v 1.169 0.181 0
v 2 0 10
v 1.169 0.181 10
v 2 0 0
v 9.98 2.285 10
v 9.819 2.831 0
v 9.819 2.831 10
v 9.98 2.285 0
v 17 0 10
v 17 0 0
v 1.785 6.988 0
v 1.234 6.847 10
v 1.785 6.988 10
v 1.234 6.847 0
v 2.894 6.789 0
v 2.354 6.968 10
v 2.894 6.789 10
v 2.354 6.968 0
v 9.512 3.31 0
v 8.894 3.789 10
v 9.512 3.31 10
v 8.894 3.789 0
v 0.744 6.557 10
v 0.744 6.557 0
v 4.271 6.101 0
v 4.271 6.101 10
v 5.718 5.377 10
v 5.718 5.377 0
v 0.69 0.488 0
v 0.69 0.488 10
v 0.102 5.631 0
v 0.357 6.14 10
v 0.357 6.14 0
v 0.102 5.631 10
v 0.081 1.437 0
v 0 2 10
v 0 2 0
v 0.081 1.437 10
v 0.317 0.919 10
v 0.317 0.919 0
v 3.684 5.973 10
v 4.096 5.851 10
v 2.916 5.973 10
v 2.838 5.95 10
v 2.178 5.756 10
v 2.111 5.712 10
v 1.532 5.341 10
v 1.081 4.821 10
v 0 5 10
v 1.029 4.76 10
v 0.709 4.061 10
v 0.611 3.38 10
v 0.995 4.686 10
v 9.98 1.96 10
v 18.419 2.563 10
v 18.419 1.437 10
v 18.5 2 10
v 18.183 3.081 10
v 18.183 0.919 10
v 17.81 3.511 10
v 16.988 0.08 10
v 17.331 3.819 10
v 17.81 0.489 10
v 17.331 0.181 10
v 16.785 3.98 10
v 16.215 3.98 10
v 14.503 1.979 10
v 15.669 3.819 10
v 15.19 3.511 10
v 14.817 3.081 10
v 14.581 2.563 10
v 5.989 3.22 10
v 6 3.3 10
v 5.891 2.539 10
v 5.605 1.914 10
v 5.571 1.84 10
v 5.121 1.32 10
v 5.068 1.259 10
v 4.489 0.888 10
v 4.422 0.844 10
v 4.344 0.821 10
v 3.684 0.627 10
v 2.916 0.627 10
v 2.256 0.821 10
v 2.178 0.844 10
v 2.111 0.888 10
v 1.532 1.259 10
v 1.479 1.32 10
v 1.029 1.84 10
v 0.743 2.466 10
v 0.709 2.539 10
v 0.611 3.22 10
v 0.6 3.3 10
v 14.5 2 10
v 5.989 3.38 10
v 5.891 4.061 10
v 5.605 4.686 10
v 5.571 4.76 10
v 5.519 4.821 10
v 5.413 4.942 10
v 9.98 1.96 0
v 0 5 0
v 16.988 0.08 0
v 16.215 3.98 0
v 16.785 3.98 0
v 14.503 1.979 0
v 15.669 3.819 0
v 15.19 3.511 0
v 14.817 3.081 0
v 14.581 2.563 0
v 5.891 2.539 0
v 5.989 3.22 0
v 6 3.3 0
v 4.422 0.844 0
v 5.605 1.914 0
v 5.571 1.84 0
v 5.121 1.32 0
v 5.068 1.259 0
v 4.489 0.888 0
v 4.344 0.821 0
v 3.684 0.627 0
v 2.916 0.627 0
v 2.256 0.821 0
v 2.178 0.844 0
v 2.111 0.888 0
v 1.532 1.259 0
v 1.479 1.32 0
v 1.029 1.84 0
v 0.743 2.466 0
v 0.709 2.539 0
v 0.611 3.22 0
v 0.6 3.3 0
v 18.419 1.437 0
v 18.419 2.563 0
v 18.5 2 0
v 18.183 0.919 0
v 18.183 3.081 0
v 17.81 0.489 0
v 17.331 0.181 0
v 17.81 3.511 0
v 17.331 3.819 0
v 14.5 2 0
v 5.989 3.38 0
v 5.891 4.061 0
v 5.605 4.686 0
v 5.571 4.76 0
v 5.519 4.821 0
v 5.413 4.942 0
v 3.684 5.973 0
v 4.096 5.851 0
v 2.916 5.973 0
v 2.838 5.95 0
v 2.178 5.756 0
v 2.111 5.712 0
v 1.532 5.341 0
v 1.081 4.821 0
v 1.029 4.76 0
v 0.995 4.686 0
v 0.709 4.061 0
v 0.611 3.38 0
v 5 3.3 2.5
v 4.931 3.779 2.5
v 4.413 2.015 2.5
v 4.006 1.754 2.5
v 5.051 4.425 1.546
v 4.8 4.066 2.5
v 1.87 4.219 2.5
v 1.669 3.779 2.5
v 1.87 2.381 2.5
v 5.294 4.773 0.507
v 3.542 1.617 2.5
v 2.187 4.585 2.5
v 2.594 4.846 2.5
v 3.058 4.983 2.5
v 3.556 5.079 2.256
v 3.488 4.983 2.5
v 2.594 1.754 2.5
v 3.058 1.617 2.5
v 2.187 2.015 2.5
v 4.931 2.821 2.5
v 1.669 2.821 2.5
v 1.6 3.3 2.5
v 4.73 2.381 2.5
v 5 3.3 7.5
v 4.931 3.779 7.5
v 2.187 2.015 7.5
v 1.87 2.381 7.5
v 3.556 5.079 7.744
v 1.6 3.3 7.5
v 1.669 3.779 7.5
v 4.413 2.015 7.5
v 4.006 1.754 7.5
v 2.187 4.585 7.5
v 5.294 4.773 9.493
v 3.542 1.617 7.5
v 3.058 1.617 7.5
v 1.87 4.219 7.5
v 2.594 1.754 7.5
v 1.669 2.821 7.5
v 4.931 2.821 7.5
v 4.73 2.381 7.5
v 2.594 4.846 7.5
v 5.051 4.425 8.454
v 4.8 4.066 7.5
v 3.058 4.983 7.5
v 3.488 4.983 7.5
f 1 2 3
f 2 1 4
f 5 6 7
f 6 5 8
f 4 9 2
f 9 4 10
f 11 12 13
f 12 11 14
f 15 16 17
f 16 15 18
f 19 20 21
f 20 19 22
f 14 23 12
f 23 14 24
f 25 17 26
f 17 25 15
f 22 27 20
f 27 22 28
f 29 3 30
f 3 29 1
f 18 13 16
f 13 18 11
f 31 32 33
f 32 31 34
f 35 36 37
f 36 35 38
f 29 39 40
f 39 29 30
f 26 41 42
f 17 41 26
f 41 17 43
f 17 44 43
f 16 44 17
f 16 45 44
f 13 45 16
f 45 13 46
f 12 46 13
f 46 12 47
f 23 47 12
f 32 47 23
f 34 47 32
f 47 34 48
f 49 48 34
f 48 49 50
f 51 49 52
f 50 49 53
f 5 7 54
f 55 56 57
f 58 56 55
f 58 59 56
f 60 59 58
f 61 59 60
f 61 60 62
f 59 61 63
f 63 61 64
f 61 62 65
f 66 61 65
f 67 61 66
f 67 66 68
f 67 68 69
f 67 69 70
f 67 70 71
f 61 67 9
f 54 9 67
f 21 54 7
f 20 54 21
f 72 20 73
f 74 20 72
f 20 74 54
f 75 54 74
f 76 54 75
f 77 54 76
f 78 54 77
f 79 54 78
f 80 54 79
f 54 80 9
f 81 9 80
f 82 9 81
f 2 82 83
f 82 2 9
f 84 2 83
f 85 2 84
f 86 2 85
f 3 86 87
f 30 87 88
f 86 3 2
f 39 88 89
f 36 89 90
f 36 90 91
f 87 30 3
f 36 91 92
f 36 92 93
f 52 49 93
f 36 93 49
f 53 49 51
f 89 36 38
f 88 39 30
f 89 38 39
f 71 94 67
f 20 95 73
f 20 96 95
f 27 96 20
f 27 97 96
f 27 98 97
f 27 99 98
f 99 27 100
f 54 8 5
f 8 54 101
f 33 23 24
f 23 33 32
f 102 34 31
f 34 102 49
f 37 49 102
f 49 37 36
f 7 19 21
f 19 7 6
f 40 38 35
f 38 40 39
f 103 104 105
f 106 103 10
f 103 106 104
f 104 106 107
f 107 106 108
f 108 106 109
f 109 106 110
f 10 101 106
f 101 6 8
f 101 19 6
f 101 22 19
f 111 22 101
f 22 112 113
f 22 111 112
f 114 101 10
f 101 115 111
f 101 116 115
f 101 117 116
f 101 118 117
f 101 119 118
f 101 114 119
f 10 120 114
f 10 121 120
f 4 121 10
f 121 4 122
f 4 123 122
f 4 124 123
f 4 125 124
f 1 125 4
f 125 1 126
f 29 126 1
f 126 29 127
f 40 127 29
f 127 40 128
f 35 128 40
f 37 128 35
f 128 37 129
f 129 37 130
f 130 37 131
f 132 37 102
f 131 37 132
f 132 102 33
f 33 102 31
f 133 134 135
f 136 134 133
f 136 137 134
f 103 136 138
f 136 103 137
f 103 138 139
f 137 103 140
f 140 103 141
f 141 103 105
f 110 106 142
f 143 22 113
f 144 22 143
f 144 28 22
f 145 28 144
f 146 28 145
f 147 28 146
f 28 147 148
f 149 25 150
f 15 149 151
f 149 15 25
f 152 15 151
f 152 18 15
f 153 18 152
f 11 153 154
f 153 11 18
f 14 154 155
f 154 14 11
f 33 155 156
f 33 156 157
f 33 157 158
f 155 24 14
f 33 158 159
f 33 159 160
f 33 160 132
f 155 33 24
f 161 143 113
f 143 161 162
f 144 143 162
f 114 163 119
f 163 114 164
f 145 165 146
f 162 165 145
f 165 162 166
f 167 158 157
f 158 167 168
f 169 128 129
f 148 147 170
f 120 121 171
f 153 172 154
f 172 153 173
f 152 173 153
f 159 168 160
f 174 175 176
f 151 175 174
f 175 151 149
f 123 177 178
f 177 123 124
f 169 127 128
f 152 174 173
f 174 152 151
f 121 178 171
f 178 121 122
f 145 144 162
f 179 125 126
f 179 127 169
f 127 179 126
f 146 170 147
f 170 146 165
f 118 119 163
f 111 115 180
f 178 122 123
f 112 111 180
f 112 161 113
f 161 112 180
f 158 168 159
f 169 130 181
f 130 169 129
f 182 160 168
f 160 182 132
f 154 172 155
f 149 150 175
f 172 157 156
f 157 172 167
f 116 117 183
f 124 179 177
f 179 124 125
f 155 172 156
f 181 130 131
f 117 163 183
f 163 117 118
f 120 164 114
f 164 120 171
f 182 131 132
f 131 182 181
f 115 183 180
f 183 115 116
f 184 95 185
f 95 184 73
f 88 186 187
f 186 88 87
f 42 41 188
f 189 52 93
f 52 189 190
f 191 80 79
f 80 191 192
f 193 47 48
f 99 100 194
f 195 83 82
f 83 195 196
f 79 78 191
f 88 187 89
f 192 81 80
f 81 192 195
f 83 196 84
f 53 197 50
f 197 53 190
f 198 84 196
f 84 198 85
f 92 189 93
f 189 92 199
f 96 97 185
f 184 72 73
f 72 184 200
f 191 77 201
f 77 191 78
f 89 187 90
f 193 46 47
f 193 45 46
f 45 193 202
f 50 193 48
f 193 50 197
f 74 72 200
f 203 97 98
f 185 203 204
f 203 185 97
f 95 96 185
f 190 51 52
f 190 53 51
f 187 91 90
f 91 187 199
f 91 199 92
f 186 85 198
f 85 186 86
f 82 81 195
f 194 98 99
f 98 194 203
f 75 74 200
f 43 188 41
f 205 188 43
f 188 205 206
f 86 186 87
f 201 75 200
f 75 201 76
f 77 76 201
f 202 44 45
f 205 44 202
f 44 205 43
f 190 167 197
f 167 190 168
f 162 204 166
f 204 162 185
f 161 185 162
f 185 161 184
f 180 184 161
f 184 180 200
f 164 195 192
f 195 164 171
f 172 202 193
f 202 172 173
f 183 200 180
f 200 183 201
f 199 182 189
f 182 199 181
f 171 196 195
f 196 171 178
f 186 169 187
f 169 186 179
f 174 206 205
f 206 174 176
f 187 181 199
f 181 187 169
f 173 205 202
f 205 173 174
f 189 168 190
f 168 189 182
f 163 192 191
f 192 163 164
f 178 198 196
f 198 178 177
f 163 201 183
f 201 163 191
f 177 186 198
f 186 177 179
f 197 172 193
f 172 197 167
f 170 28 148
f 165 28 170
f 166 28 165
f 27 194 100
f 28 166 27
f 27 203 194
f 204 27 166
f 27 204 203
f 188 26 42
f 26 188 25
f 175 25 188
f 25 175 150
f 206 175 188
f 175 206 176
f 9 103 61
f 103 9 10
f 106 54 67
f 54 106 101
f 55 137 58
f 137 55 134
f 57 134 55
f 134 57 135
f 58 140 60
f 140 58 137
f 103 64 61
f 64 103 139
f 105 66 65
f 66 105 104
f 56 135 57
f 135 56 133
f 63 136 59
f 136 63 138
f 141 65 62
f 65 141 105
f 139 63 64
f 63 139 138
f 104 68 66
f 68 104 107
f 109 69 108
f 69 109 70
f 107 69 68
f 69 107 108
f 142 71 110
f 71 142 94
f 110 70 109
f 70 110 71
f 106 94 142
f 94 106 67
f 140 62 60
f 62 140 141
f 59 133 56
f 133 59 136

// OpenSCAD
// Under1
// Fiber holder for underbody below the doors


//-------------------------------------


//--------------------------------------------
module block1(
    s1=6,  // side length
    r1=2,   // radius for fillet
    z1=10,  // height of block
    r2=1.7,  // radius for fiber cut
    t1=9   // tongue length
){
    
    pb = [ [0,0], [s1,0], [0,0.5*s1] ];
    
    difference(){
        // boss
        linear_extrude(height=z1)
        translate([r1,r1,0])
        offset(r=r1,$fn=22)
        polygon(points=pb);
        
        
        // fiber hole
        color("blue")
        translate([0.55*s1,0.55*s1,-0.5])
        cylinder(r1=r2+1.2, r2=r2,h=z1/4+0.5,$fn=22);
        color("cyan")
        translate([0.55*s1,0.55*s1,0.75*z1])
        cylinder(r1=r2, r2=r2+1.2,h=z1/4+0.5,$fn=22);
        color("orange")
        translate([0.55*s1,0.55*s1,0])
        cylinder(r=r2,h=z1,$fn=22);
        
        // stress relief
        color("pink")
        translate([0.42*s1,0.6*s1,-0.5])
        rotate([0,0,-35])
        cube([1.6,10,z1+1]);
        
    }
    
    // tongue
    hull(){
    translate([2,0,0])
    difference(){
        color("cyan")
        translate([s1,0,0])
        cylinder(r=r1,h=z1);
        
        color("red")
        translate([s1-r1,-2*r1,0])
        cube([2*r1,2*r1,z1]);
    }

    translate([t1,0,0])
    difference(){
        color("cyan")
        translate([s1,0,0])
        cylinder(r=r1,h=z1,$fn=22);
        
        color("red")
        translate([s1-r1,-2*r1,0])
        cube([2*r1,2*r1,z1]);
    }
}

    // lip on end of tongue
    color("green")
    translate([16.5,2,0])
    cylinder(r=r1,h=z1,$fn=22);
       

}






//==============================================

block1();

//=================================================
